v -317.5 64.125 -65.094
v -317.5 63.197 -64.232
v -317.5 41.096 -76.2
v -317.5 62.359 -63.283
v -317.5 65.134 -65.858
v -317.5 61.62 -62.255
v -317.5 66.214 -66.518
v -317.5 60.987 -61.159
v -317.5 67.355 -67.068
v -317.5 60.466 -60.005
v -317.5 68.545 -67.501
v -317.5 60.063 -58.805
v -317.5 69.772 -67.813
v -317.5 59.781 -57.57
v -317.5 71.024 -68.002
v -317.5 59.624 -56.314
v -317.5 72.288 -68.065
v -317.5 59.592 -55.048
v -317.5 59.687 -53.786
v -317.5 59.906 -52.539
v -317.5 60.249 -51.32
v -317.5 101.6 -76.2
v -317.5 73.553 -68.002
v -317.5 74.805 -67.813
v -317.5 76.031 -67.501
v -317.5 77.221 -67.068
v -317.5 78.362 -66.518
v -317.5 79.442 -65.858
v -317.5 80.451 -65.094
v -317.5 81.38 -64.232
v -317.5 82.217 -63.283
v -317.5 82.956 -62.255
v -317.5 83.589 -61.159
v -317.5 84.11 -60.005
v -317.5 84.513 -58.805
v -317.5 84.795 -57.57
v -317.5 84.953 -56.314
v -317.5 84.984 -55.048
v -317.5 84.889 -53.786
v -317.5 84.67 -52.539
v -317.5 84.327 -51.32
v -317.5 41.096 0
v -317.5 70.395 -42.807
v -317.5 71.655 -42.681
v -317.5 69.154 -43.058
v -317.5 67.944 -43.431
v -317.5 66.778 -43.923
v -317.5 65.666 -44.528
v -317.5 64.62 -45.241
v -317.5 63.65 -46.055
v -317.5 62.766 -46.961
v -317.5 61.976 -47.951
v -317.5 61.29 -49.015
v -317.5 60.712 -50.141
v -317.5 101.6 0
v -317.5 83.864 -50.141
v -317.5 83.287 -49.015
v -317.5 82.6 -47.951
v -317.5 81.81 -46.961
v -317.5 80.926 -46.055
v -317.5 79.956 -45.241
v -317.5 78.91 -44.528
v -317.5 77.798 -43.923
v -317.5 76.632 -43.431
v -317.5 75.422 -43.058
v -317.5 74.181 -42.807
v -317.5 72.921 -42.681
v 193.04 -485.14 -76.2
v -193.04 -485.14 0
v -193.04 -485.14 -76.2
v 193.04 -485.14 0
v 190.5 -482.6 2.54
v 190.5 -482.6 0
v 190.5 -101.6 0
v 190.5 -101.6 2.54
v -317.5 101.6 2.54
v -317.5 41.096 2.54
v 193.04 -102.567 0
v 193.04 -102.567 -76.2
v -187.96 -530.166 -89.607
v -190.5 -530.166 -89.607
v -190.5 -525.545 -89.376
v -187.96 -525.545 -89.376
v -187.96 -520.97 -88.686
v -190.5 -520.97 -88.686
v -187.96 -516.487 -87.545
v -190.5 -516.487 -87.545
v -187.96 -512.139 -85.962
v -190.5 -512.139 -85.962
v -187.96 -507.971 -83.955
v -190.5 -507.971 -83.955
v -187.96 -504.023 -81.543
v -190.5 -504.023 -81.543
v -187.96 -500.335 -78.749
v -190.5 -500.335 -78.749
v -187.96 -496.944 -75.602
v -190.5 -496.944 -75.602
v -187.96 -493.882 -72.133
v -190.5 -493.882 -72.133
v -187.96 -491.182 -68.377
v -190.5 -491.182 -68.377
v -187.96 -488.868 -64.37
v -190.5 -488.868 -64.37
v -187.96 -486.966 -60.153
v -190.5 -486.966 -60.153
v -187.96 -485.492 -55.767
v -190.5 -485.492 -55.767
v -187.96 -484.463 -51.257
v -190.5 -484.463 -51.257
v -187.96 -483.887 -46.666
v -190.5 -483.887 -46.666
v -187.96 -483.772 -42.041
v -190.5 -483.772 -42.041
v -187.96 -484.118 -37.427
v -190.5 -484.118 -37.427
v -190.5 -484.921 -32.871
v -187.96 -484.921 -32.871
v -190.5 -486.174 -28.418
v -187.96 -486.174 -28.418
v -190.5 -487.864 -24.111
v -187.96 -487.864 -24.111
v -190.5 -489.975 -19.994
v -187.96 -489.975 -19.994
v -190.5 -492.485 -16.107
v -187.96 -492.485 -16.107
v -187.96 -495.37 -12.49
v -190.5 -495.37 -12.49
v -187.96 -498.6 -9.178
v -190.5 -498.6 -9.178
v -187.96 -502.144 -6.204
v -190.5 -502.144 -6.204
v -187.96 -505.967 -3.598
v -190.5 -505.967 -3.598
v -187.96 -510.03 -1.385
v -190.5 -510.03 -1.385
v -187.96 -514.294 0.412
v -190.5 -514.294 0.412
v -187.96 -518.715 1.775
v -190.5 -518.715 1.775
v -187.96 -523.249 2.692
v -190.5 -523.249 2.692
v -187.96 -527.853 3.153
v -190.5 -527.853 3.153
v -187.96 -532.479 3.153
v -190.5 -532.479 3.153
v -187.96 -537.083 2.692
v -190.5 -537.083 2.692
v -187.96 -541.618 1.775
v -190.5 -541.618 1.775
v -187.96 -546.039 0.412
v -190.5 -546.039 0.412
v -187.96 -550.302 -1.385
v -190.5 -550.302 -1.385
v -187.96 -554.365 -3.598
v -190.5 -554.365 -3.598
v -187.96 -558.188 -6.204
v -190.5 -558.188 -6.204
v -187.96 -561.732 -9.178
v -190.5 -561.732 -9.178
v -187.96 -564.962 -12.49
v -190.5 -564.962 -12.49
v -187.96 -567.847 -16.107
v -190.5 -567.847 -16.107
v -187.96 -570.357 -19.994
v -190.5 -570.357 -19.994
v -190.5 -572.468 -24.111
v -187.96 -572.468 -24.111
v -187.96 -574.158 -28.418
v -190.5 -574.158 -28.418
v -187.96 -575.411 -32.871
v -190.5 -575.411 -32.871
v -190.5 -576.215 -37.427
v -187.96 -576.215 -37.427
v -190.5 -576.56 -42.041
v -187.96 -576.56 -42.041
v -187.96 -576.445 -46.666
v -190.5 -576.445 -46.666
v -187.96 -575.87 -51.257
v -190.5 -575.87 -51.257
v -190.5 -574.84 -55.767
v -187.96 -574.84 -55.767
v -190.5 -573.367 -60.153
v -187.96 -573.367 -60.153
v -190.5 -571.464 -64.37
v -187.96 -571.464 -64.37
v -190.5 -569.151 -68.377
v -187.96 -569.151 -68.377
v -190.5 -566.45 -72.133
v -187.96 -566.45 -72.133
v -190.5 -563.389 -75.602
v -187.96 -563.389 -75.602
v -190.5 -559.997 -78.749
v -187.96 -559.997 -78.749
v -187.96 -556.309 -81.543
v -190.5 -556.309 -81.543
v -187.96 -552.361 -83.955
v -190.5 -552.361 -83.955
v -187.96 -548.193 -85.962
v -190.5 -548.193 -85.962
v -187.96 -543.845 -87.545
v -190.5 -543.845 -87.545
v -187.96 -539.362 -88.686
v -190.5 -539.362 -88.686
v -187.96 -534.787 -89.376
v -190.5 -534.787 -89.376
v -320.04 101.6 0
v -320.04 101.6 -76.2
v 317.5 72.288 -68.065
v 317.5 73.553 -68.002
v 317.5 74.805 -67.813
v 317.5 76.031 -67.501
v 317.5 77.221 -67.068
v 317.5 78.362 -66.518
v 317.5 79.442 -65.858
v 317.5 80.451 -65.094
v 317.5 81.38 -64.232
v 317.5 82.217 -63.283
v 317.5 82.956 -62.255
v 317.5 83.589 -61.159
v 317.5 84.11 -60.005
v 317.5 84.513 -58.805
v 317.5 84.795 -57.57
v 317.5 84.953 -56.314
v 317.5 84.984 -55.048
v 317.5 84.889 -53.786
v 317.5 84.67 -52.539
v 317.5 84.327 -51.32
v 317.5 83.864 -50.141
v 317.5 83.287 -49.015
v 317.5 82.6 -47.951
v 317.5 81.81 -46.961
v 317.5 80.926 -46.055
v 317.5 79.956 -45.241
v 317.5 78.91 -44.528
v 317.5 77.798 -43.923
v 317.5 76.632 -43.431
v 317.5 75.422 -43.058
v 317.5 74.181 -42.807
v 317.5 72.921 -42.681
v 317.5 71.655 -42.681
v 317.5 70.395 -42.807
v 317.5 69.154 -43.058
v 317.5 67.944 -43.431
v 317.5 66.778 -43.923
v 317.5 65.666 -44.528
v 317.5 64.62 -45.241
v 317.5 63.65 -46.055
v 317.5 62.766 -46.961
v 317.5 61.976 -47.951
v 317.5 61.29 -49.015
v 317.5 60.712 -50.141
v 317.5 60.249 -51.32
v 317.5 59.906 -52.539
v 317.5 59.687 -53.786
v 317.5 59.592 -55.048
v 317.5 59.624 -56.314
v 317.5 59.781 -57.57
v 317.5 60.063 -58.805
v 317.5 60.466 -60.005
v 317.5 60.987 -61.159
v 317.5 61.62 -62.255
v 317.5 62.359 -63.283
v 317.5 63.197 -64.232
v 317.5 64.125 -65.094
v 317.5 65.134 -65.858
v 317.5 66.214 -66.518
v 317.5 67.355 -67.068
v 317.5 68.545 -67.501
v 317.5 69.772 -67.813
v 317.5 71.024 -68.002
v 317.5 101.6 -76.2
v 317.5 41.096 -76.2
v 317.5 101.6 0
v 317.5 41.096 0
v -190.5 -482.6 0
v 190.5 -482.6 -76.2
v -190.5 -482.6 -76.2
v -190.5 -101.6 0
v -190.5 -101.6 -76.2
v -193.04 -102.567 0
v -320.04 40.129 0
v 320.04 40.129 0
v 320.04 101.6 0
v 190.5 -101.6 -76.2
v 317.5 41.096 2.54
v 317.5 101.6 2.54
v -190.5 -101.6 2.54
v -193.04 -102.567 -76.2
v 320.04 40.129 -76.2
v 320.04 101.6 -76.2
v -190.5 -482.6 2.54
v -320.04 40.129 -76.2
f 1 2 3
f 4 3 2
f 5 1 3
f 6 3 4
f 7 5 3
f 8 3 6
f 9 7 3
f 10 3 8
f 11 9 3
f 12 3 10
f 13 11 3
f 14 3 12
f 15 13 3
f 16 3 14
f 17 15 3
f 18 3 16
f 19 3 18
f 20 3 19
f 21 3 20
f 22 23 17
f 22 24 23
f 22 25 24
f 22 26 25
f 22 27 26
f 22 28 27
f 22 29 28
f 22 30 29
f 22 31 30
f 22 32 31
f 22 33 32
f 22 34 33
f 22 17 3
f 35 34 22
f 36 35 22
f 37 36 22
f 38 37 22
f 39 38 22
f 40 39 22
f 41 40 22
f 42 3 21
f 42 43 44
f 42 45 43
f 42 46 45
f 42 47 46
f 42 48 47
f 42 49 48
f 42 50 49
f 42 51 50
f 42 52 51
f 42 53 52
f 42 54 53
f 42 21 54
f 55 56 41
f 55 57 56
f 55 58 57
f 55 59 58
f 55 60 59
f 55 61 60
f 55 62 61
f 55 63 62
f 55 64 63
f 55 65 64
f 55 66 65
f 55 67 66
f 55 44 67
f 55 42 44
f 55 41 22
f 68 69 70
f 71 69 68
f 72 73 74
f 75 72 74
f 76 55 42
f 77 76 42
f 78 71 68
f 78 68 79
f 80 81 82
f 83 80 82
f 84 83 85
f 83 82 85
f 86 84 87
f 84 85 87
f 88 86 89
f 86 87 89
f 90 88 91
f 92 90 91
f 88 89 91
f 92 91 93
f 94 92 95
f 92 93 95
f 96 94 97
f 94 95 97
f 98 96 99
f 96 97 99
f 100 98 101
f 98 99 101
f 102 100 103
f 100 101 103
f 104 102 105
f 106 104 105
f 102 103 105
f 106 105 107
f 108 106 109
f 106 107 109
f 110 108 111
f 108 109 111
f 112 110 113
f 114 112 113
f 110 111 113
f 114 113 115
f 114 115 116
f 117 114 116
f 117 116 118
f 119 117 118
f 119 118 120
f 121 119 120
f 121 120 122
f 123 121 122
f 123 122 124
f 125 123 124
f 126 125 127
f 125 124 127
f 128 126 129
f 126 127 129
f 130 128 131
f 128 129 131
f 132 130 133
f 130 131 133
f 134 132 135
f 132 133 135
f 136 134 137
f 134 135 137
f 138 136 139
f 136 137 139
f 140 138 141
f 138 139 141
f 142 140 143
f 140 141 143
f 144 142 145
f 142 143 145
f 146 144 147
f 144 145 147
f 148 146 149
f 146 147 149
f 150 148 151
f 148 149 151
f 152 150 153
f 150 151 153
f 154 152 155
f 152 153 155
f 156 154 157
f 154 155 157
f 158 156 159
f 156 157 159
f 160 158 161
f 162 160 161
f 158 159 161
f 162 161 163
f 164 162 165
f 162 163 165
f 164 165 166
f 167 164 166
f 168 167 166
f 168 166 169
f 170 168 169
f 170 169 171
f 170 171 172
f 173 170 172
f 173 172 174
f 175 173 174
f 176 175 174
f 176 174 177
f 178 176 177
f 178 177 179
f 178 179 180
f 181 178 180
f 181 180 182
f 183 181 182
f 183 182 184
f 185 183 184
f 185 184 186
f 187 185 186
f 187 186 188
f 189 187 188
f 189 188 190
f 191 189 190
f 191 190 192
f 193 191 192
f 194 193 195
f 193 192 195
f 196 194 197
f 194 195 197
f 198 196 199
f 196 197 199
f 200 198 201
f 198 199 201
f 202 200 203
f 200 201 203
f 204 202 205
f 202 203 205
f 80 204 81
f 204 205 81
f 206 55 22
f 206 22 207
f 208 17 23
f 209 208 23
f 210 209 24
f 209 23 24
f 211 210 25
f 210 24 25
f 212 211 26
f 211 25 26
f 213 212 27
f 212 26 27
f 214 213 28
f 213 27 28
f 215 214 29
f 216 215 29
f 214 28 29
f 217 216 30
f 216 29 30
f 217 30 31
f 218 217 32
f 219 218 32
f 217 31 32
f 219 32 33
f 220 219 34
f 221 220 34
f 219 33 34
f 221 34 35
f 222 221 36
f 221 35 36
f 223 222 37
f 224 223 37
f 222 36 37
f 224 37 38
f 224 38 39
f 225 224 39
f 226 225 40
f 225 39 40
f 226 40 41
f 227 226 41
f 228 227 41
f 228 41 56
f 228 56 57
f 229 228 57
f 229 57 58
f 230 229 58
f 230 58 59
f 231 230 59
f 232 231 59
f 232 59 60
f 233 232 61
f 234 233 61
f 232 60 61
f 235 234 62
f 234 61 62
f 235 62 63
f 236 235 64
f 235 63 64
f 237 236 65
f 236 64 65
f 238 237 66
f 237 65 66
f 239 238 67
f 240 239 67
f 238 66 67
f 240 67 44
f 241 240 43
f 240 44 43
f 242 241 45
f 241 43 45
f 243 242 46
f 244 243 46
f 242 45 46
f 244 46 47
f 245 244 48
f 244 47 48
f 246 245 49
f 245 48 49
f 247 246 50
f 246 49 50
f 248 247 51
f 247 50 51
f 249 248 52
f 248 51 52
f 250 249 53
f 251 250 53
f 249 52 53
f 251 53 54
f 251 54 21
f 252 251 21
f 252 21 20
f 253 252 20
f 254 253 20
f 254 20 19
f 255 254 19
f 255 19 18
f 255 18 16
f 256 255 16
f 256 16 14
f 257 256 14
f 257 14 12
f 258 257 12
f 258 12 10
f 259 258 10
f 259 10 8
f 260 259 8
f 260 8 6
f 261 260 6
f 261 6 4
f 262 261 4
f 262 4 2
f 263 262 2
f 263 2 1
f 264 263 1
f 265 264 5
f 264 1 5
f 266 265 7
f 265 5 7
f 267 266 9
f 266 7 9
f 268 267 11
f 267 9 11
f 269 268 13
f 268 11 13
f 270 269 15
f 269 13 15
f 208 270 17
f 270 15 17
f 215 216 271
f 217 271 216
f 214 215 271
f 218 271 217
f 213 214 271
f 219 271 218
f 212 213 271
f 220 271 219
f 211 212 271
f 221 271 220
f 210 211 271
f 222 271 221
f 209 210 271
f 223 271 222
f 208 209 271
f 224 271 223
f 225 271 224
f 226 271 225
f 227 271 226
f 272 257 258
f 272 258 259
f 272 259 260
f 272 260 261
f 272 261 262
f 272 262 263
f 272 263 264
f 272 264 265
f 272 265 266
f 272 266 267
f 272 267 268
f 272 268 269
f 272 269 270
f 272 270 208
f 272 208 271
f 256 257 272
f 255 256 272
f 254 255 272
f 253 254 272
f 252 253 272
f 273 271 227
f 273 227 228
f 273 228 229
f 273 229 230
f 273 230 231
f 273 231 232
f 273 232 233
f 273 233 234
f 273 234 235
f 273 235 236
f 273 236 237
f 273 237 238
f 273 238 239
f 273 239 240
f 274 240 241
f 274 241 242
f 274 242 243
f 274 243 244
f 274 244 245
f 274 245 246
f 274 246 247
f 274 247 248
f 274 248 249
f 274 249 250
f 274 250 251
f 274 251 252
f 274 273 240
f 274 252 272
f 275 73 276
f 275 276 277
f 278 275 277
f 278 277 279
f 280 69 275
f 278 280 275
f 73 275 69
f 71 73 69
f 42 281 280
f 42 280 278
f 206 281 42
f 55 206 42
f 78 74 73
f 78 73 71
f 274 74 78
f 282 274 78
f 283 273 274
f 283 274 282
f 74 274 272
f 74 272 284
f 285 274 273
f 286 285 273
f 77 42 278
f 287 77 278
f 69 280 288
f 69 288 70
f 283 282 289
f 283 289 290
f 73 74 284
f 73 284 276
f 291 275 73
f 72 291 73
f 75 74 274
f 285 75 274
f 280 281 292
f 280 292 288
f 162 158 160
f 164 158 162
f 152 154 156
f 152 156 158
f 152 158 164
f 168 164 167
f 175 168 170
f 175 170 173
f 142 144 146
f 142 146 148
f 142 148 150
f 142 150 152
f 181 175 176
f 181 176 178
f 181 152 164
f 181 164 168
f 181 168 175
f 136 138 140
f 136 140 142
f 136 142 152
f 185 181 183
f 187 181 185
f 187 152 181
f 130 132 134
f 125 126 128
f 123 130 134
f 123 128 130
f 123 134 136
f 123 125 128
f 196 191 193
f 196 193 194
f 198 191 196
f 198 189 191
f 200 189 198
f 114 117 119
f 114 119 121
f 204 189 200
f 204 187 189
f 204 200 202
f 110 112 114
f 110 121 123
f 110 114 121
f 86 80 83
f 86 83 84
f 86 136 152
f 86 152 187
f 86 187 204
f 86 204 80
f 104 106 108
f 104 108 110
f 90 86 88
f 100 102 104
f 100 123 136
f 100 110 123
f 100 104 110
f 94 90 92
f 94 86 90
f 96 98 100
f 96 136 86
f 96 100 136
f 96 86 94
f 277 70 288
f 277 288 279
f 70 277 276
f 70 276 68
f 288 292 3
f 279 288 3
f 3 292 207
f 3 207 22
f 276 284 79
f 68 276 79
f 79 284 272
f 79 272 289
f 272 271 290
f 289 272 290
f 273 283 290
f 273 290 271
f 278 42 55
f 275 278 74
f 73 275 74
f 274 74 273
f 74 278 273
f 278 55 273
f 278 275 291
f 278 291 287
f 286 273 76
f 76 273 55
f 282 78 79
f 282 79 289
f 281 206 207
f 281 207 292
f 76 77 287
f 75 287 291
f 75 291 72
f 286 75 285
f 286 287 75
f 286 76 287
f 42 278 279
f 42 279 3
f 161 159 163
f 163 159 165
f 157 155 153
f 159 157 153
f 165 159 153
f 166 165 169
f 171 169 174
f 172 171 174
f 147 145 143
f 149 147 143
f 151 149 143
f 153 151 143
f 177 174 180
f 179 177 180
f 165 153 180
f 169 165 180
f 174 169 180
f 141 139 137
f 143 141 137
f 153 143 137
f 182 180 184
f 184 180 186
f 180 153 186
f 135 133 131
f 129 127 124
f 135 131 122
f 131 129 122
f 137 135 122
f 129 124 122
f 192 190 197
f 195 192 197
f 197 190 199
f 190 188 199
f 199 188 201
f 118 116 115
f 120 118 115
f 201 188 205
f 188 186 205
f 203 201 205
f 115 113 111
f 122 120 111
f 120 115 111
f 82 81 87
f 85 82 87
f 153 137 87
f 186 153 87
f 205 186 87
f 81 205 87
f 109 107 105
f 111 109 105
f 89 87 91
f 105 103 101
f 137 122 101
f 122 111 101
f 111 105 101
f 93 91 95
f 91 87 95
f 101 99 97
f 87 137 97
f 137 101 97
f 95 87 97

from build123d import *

# Parameters (mm, degrees)
BOSS_EXTRUDE1_DEPTH = 2.54
EXTRUDE_THIN1_DEPTH = 76.2
BOSS_EXTRUDE4_REACH = 806.751
SKETCH5_R           = 12.7
SKETCH9_R           = 46.40857606
BOSS_EXTRUDE6_DEPTH = 2.54


with BuildPart() as part:
    # Sketch1 → Boss-Extrude1 (new body)
    with BuildSketch(Plane.XY):
        Polygon((190.5, -101.6), (317.5, 41.095782204), (317.5, 101.6), (-317.5, 101.6), (-317.5, 41.095782204), (-190.5, -101.6), (-190.5, -482.6), (190.5, -482.6), align=None)
    extrude(amount=BOSS_EXTRUDE1_DEPTH)


with BuildPart() as body_2:
    # Sketch4 → Extrude-Thin1 (new body)
    with BuildSketch(Plane(origin=(0, 0, 0), x_dir=(-1, 0, 0), z_dir=(0, 0, -1))):
        Polygon((-317.5, 101.6), (-317.5, 41.095782204), (-190.5, -101.6), (-190.5, -482.6), (190.5, -482.6), (190.5, -101.6), (317.5, 41.095782204), (317.5, 101.6), (320.04, 101.6), (320.04, 40.129169808), (193.04, -102.566612396), (193.04, -485.14), (-193.04, -485.14), (-193.04, -102.566612396), (-320.04, 40.129169808), (-320.04, 101.6), align=None)
    extrude(amount=EXTRUDE_THIN1_DEPTH)

    # Sketch5 → Boss-Extrude4 (add, up to next)
    with BuildSketch(Plane(origin=(-317.5, 0, 0), x_dir=(0, 0, -1), z_dir=(1, 0, 0)), mode=Mode.PRIVATE) as boss_extrude4_sk1:
        with Locations((55.364828068, 72.288057332)):
            Circle(SKETCH5_R)
    boss_extrude4_tool1 = extrude(boss_extrude4_sk1.sketch, amount=BOSS_EXTRUDE4_REACH, mode=Mode.PRIVATE) - body_2.part
    add(boss_extrude4_tool1.solids().sort_by_distance((-317.5, 72.288057, -55.364828))[0])


with BuildPart() as body_3:
    # Sketch9 → Boss-Extrude6 (new body)
    with BuildSketch(Plane(origin=(-190.5, -297.860084408, 89.625050191), x_dir=(0, 0, -1), z_dir=(1, 0, 0))):
        with Locations((132.823064522, -232.306086863)):
            Circle(SKETCH9_R)
    extrude(amount=BOSS_EXTRUDE6_DEPTH)


solid = Compound([part.part, body_2.part, body_3.part])
